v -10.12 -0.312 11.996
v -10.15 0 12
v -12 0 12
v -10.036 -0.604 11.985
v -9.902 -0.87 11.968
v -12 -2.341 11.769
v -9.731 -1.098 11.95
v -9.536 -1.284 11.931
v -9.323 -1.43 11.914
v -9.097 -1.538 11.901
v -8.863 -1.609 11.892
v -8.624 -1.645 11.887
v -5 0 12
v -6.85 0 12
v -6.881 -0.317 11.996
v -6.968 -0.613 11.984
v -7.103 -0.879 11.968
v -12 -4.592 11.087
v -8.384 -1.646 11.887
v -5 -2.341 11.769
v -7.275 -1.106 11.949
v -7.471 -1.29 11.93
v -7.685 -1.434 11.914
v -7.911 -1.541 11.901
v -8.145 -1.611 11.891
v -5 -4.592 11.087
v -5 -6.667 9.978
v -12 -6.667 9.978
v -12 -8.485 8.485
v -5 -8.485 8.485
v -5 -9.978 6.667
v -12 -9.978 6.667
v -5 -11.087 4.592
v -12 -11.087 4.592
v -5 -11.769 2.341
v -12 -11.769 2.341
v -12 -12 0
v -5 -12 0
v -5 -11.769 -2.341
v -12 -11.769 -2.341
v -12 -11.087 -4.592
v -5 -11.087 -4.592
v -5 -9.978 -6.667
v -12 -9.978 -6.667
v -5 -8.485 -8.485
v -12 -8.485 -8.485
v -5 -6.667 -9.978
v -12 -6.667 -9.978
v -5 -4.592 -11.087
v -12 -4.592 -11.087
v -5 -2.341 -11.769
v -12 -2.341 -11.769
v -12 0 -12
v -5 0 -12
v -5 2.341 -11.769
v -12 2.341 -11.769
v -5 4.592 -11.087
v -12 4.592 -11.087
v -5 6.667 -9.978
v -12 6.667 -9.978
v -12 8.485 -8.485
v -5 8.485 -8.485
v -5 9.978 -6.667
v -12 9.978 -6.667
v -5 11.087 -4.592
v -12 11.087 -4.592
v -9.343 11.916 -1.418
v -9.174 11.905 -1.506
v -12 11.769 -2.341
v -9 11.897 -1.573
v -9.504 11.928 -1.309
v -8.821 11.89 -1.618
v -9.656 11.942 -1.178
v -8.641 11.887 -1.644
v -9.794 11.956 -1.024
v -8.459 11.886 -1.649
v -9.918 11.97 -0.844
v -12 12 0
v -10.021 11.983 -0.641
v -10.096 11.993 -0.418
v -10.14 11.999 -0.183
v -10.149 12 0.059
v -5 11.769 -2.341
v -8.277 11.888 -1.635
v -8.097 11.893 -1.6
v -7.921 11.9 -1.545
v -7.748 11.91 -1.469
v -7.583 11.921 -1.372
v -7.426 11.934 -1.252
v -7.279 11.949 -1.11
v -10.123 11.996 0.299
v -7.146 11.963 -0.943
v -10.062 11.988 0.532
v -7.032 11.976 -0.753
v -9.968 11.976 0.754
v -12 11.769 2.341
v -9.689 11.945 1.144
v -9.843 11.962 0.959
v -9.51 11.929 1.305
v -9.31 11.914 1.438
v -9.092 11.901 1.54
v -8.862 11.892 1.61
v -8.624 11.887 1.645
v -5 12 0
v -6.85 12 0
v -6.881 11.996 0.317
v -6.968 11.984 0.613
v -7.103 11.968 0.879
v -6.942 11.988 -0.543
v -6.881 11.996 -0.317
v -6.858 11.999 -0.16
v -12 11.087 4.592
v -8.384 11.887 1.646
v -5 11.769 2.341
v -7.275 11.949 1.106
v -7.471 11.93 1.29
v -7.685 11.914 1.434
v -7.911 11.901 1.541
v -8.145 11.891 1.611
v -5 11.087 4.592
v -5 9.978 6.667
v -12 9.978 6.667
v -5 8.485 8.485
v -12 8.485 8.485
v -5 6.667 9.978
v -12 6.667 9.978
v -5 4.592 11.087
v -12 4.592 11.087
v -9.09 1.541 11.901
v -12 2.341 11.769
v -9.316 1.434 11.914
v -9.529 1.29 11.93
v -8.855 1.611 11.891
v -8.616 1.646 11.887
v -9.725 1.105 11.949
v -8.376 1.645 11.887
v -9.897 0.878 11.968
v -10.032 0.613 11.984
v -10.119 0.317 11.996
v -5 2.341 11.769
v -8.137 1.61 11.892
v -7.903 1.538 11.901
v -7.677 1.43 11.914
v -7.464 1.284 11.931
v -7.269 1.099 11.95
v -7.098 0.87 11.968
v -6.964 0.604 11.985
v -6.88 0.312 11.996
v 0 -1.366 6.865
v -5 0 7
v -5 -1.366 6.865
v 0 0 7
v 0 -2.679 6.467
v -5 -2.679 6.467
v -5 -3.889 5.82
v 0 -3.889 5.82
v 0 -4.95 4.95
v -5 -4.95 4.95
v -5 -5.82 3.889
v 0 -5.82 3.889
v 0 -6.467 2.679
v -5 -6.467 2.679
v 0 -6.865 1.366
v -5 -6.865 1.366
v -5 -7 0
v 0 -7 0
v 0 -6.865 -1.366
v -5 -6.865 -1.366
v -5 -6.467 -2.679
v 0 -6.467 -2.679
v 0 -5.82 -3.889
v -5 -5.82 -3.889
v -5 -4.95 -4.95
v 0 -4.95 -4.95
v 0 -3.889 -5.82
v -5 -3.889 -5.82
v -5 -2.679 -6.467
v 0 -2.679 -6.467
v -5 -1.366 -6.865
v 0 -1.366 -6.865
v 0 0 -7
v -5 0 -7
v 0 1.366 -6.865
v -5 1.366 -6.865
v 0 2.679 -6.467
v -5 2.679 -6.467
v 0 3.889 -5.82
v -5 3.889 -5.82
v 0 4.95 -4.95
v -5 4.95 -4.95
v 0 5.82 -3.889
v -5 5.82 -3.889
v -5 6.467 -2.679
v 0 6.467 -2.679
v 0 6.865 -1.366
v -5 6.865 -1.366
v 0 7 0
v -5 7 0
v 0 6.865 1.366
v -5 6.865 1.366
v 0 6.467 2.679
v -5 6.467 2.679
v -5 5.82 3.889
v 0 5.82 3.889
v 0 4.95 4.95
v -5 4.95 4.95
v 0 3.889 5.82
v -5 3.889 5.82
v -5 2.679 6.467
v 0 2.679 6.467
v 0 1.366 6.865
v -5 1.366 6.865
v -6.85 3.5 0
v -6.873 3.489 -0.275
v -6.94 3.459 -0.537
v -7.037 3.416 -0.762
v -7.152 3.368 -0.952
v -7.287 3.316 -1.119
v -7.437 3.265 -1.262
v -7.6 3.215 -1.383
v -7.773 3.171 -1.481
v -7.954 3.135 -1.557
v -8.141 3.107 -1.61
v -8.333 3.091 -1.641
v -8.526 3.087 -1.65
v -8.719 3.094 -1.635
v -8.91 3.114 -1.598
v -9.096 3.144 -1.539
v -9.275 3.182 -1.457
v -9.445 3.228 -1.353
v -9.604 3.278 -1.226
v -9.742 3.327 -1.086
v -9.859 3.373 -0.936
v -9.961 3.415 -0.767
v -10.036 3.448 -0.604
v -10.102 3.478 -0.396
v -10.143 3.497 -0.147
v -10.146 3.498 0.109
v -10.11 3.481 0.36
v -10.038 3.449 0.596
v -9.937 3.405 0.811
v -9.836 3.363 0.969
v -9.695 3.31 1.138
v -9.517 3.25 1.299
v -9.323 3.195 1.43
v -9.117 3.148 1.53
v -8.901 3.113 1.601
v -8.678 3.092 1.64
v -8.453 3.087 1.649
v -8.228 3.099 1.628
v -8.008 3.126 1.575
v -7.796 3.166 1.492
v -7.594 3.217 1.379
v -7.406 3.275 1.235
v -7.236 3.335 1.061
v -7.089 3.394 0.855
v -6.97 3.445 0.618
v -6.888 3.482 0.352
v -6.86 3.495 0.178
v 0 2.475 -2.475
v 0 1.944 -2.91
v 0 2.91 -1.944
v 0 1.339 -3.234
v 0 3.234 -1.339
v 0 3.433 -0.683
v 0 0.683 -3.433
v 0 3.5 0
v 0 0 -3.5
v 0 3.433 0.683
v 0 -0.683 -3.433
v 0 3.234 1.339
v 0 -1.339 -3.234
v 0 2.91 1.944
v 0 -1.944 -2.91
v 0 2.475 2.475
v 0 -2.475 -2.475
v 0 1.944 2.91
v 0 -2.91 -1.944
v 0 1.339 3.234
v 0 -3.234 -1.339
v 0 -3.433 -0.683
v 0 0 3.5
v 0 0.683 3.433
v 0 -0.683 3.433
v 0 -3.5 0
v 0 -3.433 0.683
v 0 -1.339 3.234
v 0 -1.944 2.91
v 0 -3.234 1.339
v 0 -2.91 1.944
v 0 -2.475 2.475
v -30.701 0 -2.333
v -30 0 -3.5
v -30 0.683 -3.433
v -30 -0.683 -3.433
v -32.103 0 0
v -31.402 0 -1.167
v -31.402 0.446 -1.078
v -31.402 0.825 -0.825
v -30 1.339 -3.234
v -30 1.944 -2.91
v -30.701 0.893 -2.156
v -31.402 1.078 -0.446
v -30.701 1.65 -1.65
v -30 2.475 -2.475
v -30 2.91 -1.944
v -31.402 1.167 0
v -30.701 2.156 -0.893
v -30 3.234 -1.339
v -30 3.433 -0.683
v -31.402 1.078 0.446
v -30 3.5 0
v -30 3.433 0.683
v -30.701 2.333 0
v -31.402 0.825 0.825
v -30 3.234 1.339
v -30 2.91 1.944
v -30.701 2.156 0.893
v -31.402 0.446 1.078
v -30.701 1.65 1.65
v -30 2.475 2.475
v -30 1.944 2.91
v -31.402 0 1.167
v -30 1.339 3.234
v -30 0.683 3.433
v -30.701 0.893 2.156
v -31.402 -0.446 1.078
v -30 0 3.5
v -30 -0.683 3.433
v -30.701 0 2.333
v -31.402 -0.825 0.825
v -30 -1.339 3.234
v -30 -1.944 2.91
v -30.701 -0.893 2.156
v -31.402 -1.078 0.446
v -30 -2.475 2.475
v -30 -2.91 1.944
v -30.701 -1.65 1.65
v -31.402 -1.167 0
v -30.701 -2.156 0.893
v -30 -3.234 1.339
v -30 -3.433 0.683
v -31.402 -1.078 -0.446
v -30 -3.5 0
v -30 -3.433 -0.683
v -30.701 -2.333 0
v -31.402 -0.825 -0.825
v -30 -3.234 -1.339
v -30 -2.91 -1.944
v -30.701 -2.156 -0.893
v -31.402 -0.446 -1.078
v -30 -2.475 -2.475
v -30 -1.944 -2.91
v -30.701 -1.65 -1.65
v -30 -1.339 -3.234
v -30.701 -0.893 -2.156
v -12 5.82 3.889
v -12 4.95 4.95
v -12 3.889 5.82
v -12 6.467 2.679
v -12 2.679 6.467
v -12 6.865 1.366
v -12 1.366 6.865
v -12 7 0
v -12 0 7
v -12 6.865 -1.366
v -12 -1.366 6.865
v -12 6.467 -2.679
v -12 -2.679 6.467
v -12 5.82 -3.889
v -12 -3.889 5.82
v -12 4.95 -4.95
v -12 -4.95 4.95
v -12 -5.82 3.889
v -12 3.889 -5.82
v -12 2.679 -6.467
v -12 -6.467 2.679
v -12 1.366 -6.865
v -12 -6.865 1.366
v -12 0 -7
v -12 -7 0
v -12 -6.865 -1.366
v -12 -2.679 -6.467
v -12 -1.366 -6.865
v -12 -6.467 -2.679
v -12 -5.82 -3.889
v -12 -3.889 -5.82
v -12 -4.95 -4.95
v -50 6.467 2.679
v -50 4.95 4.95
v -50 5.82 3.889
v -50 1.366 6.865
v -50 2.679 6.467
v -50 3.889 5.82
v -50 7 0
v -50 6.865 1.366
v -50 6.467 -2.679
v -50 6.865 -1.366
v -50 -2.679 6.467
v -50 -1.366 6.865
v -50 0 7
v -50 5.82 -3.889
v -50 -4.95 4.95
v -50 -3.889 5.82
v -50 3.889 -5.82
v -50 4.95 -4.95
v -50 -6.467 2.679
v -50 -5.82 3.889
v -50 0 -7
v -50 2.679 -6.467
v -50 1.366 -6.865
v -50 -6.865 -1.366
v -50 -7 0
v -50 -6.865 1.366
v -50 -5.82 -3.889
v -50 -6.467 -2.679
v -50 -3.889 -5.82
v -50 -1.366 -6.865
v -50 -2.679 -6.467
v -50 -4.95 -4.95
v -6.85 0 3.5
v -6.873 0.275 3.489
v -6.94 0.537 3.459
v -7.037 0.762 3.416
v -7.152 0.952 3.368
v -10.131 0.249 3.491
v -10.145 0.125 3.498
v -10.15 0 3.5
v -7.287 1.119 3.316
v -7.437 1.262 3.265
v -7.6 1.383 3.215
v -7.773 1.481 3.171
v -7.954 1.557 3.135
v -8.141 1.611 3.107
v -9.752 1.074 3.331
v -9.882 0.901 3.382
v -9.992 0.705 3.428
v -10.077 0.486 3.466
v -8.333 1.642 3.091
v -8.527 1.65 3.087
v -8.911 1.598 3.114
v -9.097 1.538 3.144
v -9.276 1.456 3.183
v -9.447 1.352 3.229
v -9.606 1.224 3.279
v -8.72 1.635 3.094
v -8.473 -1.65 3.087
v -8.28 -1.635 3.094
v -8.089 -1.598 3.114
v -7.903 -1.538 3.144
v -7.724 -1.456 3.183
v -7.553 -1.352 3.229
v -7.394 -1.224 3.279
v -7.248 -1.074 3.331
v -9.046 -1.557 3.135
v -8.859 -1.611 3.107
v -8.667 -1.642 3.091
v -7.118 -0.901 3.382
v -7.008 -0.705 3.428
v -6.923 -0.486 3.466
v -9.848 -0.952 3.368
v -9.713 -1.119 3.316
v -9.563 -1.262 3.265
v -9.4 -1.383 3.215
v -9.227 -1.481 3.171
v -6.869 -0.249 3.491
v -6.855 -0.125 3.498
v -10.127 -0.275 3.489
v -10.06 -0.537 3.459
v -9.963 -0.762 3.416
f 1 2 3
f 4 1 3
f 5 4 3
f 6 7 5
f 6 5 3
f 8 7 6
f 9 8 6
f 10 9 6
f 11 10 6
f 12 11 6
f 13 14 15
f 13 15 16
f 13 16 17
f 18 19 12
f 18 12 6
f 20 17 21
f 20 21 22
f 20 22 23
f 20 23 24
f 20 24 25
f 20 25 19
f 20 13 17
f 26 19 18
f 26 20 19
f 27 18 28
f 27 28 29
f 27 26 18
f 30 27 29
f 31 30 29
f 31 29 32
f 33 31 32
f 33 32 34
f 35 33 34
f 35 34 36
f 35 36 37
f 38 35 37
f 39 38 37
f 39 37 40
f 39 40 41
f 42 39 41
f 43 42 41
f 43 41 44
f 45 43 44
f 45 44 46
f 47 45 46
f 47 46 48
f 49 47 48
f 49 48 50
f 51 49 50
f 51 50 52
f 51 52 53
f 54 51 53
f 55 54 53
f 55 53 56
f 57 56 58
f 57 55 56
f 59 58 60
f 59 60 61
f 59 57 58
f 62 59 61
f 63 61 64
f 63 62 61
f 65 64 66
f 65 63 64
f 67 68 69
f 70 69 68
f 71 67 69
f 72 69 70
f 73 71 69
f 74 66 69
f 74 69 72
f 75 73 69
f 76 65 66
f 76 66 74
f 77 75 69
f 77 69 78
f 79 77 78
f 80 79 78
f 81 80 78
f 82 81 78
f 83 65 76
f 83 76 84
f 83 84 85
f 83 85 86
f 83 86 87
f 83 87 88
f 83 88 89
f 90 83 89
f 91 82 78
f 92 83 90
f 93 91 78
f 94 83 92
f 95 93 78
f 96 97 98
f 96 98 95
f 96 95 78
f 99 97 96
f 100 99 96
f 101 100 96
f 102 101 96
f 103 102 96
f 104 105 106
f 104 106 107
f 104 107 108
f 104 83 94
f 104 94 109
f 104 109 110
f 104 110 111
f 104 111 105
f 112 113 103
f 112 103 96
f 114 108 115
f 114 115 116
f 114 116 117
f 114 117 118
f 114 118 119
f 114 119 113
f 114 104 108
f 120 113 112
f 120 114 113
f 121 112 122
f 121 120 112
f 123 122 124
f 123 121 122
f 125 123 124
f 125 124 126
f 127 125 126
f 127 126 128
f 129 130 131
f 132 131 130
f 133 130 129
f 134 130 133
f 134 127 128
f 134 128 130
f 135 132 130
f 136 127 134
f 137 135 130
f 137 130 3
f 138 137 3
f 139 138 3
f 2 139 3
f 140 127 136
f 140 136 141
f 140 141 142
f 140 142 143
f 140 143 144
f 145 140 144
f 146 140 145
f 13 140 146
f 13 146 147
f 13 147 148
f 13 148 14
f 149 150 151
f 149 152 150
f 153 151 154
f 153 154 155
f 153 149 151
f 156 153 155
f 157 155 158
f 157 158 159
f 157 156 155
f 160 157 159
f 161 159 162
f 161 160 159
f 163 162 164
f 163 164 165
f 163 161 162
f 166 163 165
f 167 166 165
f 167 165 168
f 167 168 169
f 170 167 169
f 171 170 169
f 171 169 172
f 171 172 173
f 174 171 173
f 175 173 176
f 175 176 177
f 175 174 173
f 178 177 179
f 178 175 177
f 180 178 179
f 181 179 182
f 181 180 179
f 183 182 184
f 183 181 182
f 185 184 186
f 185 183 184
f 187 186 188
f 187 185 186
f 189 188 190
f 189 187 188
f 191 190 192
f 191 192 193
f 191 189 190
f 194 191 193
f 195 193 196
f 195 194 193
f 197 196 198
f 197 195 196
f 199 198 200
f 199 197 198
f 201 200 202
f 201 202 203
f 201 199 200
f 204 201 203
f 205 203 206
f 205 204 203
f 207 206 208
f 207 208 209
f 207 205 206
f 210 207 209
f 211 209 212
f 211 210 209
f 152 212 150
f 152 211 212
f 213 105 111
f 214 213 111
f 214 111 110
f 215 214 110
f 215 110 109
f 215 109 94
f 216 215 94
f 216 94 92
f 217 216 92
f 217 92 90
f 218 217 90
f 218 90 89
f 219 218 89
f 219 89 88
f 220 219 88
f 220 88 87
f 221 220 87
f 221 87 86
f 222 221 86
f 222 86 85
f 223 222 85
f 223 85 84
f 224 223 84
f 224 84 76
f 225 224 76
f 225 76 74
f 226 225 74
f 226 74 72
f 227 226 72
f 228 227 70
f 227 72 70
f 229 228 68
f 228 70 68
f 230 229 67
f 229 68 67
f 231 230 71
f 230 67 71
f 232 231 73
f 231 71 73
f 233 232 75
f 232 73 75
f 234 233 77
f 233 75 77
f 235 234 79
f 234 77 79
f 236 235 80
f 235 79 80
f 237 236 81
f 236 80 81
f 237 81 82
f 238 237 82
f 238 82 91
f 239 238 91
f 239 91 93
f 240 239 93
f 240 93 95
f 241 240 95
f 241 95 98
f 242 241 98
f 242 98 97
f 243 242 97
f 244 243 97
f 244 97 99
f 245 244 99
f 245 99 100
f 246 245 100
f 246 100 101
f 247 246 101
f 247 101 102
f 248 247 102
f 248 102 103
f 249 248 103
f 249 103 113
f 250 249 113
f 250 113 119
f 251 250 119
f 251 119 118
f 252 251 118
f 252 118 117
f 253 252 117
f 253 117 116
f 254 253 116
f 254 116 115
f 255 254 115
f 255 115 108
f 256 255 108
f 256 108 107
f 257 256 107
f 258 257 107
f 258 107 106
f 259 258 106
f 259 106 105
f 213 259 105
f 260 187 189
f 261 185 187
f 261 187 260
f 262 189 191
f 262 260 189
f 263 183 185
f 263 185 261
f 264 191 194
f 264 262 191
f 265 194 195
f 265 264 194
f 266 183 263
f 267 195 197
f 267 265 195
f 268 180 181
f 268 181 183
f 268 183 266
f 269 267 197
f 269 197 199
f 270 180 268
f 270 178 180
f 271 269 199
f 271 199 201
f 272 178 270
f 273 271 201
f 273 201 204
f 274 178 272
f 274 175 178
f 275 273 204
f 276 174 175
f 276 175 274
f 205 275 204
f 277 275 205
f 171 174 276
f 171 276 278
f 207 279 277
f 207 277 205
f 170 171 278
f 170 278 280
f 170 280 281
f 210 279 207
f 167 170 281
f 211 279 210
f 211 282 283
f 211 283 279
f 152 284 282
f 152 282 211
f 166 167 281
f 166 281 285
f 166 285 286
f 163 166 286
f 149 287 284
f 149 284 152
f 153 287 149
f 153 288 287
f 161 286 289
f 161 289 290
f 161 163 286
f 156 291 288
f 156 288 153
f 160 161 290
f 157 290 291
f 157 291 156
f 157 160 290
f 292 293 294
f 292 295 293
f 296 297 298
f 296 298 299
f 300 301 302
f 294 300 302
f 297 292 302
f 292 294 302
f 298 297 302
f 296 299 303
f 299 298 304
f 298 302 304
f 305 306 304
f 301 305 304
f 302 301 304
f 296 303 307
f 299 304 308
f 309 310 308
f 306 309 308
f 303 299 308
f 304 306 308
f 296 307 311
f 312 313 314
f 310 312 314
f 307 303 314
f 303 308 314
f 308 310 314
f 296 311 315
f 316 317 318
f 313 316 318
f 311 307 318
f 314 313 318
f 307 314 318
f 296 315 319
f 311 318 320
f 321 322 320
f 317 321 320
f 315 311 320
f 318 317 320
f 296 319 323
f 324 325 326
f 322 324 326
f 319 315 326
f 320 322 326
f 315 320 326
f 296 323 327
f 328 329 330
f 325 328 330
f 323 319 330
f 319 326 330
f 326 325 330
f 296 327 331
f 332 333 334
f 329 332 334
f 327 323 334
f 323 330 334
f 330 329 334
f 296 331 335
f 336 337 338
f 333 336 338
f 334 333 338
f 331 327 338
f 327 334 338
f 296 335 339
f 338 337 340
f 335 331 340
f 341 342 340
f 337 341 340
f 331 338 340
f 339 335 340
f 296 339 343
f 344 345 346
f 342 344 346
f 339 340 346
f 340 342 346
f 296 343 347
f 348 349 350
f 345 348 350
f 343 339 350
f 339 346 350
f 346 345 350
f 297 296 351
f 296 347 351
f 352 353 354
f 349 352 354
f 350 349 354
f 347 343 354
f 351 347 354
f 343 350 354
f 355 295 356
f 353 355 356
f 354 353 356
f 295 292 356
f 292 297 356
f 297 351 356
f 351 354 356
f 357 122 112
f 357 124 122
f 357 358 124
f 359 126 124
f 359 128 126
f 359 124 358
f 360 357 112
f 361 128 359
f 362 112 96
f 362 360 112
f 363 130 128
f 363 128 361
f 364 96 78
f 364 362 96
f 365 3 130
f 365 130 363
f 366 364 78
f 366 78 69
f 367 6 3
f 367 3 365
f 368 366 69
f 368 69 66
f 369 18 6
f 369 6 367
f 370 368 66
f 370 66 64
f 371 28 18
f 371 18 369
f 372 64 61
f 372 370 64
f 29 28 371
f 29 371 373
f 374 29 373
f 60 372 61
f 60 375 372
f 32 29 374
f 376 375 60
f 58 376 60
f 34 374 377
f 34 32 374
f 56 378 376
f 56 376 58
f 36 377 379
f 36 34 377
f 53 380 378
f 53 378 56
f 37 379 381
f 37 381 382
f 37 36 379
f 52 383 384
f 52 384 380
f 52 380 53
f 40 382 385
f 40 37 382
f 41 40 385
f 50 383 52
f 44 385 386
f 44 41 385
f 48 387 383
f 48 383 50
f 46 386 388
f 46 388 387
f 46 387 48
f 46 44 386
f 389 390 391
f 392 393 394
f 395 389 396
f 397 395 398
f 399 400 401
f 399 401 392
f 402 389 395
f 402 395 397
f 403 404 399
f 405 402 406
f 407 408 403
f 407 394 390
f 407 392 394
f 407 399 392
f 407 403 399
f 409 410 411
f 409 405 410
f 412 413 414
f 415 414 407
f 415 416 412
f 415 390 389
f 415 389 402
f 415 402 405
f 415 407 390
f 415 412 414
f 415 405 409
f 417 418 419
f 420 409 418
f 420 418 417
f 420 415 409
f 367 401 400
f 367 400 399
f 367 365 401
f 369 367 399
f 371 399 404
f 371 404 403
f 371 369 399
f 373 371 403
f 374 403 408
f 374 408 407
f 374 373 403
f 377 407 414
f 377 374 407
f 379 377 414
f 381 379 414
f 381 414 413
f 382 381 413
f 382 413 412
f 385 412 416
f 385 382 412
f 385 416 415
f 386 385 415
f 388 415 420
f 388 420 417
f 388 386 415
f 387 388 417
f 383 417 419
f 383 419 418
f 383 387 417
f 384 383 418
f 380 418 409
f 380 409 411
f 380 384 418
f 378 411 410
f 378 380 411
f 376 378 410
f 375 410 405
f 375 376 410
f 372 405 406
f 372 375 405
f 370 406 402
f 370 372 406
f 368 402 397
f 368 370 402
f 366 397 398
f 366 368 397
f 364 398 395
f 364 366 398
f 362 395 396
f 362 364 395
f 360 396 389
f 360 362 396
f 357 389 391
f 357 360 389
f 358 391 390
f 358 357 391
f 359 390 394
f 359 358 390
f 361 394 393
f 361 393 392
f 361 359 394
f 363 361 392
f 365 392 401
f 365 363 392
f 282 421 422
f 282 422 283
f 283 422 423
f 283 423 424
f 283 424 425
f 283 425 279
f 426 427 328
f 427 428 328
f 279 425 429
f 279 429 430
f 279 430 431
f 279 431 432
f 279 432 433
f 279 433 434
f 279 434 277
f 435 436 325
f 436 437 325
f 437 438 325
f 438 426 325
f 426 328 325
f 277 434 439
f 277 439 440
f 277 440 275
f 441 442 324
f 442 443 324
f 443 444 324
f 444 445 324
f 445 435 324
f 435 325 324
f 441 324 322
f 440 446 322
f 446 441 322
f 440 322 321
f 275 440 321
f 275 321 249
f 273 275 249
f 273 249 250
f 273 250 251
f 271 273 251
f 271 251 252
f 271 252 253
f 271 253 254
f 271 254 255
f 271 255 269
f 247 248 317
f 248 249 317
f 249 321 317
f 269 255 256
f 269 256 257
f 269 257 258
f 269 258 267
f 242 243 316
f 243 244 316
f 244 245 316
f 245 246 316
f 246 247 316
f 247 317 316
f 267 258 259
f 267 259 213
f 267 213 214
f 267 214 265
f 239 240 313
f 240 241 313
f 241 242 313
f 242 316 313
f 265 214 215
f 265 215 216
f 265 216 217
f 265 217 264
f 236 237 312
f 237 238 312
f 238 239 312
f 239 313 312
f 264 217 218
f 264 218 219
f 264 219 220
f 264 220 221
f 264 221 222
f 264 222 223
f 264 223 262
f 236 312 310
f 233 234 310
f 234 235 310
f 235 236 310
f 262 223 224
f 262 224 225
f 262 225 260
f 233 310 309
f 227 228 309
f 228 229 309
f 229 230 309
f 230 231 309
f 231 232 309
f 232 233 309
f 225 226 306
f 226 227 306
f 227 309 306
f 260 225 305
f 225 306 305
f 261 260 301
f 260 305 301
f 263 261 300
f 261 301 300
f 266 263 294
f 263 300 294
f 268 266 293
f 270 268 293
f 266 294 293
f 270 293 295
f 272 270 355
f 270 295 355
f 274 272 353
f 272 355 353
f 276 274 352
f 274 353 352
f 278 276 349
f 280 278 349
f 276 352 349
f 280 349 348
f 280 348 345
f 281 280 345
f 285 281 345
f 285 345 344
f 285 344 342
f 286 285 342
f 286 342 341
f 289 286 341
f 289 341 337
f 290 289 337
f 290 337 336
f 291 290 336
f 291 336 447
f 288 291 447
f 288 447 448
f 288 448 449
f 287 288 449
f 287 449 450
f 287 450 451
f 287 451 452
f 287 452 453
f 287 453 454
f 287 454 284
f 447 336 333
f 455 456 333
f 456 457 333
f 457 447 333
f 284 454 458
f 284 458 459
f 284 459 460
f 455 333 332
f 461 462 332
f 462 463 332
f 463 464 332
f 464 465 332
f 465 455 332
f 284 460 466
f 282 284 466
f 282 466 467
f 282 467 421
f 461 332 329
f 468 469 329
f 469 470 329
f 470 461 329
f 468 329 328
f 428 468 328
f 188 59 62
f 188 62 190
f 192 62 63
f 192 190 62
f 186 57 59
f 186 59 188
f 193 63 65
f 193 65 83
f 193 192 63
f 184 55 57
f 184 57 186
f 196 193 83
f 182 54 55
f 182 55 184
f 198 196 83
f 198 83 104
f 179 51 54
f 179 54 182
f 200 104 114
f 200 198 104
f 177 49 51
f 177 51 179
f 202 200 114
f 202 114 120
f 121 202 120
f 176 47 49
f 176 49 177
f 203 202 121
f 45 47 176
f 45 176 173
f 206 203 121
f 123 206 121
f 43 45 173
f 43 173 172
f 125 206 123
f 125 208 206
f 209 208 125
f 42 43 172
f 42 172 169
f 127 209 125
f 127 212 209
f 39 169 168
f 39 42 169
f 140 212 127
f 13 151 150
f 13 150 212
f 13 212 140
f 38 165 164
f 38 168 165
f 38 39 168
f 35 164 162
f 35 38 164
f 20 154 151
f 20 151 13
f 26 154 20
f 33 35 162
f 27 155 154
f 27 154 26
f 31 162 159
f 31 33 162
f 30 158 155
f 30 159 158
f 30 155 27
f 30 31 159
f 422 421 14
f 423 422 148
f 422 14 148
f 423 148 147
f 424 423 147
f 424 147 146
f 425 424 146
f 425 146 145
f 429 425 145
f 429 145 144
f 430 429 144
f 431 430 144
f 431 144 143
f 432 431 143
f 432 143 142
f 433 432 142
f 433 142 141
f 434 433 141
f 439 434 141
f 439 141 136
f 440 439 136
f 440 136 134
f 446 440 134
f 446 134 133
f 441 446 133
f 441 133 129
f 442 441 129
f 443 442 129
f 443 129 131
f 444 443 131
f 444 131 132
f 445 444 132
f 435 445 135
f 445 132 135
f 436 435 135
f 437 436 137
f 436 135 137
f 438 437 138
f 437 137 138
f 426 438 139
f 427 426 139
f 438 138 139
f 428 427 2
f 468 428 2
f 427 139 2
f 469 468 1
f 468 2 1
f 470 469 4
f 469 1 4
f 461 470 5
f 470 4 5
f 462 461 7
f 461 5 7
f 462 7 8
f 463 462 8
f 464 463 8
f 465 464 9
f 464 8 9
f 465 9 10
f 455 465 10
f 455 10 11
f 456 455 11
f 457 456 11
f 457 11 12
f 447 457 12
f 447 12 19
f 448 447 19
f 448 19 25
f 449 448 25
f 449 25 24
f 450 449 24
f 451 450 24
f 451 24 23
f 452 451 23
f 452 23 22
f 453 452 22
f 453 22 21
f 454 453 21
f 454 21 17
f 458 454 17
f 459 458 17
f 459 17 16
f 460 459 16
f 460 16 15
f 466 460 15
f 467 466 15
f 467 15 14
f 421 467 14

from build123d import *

# Parameters (mm, degrees)
TROU_TARAUD_M8X1_01_D     = 7
TROU_TARAUD_M8X1_01_DEPTH = 30
TROU_TARAUD_M8X1_01_TIP   = 2.103012167
TROU_TARAUD_M41_REACH     = 58.745
TROU_TARAUD_M41_BORE_R    = 1.65
TROU_TARAUD_M42_REACH     = 58.745
TROU_TARAUD_M42_BORE_R    = 1.65


with BuildPart() as part:
    # Sketch1 → Revolve1 (revolve)
    with BuildSketch(Plane.XY, mode=Mode.PRIVATE) as revolve1_sk:
        Polygon((-5, 12), (-5, 7), (0, 7), (0, 0), (-50, 0), (-50, 7), (-12, 7), (-12, 12), align=None)
    revolve(revolve1_sk.sketch.rotate(Axis((-78.343949045, 0, 0), (1, 0, 0)), 90), axis=Axis((-78.343949045, 0, 0), (1, 0, 0)))

    # Trou taraudé M8x1.01
    with Locations(Plane(origin=(0, 0, 0), x_dir=(0, 0, -1), z_dir=(1, 0, 0))):
        with Locations((0, 0)):
            Hole(TROU_TARAUD_M8X1_01_D / 2, depth=TROU_TARAUD_M8X1_01_DEPTH)
            with Locations((0, 0, -(TROU_TARAUD_M8X1_01_DEPTH + TROU_TARAUD_M8X1_01_TIP / 2))):  # 118° drill point
                Cone(0, TROU_TARAUD_M8X1_01_D / 2, TROU_TARAUD_M8X1_01_TIP, mode=Mode.SUBTRACT)

    # Trou taraudé M41 bore → Trou taraudé M41 (cut, up to next)
    with BuildSketch(Plane.XY.offset(12), mode=Mode.PRIVATE) as trou_taraud_m41_sk1:
        with Locations((-8.5, 0)):
            Circle(TROU_TARAUD_M41_BORE_R)
    trou_taraud_m41_tool1 = extrude(trou_taraud_m41_sk1.sketch, amount=-TROU_TARAUD_M41_REACH, mode=Mode.PRIVATE) & part.part
    add(trou_taraud_m41_tool1.solids().sort_by_distance((-8.5, 0, 12))[0], mode=Mode.SUBTRACT)

    # Trou taraudé M42 bore → Trou taraudé M42 (cut, up to next)
    with BuildSketch(Plane(origin=(0, 12, 0), x_dir=(1, 0, 0), z_dir=(0, 1, 0)), mode=Mode.PRIVATE) as trou_taraud_m42_sk1:
        with Locations((-8.5, 0)):
            Circle(TROU_TARAUD_M42_BORE_R)
    trou_taraud_m42_tool1 = extrude(trou_taraud_m42_sk1.sketch, amount=-TROU_TARAUD_M42_REACH, mode=Mode.PRIVATE) & part.part
    add(trou_taraud_m42_tool1.solids().sort_by_distance((-8.5, 12, 0))[0], mode=Mode.SUBTRACT)


solid = part.part
